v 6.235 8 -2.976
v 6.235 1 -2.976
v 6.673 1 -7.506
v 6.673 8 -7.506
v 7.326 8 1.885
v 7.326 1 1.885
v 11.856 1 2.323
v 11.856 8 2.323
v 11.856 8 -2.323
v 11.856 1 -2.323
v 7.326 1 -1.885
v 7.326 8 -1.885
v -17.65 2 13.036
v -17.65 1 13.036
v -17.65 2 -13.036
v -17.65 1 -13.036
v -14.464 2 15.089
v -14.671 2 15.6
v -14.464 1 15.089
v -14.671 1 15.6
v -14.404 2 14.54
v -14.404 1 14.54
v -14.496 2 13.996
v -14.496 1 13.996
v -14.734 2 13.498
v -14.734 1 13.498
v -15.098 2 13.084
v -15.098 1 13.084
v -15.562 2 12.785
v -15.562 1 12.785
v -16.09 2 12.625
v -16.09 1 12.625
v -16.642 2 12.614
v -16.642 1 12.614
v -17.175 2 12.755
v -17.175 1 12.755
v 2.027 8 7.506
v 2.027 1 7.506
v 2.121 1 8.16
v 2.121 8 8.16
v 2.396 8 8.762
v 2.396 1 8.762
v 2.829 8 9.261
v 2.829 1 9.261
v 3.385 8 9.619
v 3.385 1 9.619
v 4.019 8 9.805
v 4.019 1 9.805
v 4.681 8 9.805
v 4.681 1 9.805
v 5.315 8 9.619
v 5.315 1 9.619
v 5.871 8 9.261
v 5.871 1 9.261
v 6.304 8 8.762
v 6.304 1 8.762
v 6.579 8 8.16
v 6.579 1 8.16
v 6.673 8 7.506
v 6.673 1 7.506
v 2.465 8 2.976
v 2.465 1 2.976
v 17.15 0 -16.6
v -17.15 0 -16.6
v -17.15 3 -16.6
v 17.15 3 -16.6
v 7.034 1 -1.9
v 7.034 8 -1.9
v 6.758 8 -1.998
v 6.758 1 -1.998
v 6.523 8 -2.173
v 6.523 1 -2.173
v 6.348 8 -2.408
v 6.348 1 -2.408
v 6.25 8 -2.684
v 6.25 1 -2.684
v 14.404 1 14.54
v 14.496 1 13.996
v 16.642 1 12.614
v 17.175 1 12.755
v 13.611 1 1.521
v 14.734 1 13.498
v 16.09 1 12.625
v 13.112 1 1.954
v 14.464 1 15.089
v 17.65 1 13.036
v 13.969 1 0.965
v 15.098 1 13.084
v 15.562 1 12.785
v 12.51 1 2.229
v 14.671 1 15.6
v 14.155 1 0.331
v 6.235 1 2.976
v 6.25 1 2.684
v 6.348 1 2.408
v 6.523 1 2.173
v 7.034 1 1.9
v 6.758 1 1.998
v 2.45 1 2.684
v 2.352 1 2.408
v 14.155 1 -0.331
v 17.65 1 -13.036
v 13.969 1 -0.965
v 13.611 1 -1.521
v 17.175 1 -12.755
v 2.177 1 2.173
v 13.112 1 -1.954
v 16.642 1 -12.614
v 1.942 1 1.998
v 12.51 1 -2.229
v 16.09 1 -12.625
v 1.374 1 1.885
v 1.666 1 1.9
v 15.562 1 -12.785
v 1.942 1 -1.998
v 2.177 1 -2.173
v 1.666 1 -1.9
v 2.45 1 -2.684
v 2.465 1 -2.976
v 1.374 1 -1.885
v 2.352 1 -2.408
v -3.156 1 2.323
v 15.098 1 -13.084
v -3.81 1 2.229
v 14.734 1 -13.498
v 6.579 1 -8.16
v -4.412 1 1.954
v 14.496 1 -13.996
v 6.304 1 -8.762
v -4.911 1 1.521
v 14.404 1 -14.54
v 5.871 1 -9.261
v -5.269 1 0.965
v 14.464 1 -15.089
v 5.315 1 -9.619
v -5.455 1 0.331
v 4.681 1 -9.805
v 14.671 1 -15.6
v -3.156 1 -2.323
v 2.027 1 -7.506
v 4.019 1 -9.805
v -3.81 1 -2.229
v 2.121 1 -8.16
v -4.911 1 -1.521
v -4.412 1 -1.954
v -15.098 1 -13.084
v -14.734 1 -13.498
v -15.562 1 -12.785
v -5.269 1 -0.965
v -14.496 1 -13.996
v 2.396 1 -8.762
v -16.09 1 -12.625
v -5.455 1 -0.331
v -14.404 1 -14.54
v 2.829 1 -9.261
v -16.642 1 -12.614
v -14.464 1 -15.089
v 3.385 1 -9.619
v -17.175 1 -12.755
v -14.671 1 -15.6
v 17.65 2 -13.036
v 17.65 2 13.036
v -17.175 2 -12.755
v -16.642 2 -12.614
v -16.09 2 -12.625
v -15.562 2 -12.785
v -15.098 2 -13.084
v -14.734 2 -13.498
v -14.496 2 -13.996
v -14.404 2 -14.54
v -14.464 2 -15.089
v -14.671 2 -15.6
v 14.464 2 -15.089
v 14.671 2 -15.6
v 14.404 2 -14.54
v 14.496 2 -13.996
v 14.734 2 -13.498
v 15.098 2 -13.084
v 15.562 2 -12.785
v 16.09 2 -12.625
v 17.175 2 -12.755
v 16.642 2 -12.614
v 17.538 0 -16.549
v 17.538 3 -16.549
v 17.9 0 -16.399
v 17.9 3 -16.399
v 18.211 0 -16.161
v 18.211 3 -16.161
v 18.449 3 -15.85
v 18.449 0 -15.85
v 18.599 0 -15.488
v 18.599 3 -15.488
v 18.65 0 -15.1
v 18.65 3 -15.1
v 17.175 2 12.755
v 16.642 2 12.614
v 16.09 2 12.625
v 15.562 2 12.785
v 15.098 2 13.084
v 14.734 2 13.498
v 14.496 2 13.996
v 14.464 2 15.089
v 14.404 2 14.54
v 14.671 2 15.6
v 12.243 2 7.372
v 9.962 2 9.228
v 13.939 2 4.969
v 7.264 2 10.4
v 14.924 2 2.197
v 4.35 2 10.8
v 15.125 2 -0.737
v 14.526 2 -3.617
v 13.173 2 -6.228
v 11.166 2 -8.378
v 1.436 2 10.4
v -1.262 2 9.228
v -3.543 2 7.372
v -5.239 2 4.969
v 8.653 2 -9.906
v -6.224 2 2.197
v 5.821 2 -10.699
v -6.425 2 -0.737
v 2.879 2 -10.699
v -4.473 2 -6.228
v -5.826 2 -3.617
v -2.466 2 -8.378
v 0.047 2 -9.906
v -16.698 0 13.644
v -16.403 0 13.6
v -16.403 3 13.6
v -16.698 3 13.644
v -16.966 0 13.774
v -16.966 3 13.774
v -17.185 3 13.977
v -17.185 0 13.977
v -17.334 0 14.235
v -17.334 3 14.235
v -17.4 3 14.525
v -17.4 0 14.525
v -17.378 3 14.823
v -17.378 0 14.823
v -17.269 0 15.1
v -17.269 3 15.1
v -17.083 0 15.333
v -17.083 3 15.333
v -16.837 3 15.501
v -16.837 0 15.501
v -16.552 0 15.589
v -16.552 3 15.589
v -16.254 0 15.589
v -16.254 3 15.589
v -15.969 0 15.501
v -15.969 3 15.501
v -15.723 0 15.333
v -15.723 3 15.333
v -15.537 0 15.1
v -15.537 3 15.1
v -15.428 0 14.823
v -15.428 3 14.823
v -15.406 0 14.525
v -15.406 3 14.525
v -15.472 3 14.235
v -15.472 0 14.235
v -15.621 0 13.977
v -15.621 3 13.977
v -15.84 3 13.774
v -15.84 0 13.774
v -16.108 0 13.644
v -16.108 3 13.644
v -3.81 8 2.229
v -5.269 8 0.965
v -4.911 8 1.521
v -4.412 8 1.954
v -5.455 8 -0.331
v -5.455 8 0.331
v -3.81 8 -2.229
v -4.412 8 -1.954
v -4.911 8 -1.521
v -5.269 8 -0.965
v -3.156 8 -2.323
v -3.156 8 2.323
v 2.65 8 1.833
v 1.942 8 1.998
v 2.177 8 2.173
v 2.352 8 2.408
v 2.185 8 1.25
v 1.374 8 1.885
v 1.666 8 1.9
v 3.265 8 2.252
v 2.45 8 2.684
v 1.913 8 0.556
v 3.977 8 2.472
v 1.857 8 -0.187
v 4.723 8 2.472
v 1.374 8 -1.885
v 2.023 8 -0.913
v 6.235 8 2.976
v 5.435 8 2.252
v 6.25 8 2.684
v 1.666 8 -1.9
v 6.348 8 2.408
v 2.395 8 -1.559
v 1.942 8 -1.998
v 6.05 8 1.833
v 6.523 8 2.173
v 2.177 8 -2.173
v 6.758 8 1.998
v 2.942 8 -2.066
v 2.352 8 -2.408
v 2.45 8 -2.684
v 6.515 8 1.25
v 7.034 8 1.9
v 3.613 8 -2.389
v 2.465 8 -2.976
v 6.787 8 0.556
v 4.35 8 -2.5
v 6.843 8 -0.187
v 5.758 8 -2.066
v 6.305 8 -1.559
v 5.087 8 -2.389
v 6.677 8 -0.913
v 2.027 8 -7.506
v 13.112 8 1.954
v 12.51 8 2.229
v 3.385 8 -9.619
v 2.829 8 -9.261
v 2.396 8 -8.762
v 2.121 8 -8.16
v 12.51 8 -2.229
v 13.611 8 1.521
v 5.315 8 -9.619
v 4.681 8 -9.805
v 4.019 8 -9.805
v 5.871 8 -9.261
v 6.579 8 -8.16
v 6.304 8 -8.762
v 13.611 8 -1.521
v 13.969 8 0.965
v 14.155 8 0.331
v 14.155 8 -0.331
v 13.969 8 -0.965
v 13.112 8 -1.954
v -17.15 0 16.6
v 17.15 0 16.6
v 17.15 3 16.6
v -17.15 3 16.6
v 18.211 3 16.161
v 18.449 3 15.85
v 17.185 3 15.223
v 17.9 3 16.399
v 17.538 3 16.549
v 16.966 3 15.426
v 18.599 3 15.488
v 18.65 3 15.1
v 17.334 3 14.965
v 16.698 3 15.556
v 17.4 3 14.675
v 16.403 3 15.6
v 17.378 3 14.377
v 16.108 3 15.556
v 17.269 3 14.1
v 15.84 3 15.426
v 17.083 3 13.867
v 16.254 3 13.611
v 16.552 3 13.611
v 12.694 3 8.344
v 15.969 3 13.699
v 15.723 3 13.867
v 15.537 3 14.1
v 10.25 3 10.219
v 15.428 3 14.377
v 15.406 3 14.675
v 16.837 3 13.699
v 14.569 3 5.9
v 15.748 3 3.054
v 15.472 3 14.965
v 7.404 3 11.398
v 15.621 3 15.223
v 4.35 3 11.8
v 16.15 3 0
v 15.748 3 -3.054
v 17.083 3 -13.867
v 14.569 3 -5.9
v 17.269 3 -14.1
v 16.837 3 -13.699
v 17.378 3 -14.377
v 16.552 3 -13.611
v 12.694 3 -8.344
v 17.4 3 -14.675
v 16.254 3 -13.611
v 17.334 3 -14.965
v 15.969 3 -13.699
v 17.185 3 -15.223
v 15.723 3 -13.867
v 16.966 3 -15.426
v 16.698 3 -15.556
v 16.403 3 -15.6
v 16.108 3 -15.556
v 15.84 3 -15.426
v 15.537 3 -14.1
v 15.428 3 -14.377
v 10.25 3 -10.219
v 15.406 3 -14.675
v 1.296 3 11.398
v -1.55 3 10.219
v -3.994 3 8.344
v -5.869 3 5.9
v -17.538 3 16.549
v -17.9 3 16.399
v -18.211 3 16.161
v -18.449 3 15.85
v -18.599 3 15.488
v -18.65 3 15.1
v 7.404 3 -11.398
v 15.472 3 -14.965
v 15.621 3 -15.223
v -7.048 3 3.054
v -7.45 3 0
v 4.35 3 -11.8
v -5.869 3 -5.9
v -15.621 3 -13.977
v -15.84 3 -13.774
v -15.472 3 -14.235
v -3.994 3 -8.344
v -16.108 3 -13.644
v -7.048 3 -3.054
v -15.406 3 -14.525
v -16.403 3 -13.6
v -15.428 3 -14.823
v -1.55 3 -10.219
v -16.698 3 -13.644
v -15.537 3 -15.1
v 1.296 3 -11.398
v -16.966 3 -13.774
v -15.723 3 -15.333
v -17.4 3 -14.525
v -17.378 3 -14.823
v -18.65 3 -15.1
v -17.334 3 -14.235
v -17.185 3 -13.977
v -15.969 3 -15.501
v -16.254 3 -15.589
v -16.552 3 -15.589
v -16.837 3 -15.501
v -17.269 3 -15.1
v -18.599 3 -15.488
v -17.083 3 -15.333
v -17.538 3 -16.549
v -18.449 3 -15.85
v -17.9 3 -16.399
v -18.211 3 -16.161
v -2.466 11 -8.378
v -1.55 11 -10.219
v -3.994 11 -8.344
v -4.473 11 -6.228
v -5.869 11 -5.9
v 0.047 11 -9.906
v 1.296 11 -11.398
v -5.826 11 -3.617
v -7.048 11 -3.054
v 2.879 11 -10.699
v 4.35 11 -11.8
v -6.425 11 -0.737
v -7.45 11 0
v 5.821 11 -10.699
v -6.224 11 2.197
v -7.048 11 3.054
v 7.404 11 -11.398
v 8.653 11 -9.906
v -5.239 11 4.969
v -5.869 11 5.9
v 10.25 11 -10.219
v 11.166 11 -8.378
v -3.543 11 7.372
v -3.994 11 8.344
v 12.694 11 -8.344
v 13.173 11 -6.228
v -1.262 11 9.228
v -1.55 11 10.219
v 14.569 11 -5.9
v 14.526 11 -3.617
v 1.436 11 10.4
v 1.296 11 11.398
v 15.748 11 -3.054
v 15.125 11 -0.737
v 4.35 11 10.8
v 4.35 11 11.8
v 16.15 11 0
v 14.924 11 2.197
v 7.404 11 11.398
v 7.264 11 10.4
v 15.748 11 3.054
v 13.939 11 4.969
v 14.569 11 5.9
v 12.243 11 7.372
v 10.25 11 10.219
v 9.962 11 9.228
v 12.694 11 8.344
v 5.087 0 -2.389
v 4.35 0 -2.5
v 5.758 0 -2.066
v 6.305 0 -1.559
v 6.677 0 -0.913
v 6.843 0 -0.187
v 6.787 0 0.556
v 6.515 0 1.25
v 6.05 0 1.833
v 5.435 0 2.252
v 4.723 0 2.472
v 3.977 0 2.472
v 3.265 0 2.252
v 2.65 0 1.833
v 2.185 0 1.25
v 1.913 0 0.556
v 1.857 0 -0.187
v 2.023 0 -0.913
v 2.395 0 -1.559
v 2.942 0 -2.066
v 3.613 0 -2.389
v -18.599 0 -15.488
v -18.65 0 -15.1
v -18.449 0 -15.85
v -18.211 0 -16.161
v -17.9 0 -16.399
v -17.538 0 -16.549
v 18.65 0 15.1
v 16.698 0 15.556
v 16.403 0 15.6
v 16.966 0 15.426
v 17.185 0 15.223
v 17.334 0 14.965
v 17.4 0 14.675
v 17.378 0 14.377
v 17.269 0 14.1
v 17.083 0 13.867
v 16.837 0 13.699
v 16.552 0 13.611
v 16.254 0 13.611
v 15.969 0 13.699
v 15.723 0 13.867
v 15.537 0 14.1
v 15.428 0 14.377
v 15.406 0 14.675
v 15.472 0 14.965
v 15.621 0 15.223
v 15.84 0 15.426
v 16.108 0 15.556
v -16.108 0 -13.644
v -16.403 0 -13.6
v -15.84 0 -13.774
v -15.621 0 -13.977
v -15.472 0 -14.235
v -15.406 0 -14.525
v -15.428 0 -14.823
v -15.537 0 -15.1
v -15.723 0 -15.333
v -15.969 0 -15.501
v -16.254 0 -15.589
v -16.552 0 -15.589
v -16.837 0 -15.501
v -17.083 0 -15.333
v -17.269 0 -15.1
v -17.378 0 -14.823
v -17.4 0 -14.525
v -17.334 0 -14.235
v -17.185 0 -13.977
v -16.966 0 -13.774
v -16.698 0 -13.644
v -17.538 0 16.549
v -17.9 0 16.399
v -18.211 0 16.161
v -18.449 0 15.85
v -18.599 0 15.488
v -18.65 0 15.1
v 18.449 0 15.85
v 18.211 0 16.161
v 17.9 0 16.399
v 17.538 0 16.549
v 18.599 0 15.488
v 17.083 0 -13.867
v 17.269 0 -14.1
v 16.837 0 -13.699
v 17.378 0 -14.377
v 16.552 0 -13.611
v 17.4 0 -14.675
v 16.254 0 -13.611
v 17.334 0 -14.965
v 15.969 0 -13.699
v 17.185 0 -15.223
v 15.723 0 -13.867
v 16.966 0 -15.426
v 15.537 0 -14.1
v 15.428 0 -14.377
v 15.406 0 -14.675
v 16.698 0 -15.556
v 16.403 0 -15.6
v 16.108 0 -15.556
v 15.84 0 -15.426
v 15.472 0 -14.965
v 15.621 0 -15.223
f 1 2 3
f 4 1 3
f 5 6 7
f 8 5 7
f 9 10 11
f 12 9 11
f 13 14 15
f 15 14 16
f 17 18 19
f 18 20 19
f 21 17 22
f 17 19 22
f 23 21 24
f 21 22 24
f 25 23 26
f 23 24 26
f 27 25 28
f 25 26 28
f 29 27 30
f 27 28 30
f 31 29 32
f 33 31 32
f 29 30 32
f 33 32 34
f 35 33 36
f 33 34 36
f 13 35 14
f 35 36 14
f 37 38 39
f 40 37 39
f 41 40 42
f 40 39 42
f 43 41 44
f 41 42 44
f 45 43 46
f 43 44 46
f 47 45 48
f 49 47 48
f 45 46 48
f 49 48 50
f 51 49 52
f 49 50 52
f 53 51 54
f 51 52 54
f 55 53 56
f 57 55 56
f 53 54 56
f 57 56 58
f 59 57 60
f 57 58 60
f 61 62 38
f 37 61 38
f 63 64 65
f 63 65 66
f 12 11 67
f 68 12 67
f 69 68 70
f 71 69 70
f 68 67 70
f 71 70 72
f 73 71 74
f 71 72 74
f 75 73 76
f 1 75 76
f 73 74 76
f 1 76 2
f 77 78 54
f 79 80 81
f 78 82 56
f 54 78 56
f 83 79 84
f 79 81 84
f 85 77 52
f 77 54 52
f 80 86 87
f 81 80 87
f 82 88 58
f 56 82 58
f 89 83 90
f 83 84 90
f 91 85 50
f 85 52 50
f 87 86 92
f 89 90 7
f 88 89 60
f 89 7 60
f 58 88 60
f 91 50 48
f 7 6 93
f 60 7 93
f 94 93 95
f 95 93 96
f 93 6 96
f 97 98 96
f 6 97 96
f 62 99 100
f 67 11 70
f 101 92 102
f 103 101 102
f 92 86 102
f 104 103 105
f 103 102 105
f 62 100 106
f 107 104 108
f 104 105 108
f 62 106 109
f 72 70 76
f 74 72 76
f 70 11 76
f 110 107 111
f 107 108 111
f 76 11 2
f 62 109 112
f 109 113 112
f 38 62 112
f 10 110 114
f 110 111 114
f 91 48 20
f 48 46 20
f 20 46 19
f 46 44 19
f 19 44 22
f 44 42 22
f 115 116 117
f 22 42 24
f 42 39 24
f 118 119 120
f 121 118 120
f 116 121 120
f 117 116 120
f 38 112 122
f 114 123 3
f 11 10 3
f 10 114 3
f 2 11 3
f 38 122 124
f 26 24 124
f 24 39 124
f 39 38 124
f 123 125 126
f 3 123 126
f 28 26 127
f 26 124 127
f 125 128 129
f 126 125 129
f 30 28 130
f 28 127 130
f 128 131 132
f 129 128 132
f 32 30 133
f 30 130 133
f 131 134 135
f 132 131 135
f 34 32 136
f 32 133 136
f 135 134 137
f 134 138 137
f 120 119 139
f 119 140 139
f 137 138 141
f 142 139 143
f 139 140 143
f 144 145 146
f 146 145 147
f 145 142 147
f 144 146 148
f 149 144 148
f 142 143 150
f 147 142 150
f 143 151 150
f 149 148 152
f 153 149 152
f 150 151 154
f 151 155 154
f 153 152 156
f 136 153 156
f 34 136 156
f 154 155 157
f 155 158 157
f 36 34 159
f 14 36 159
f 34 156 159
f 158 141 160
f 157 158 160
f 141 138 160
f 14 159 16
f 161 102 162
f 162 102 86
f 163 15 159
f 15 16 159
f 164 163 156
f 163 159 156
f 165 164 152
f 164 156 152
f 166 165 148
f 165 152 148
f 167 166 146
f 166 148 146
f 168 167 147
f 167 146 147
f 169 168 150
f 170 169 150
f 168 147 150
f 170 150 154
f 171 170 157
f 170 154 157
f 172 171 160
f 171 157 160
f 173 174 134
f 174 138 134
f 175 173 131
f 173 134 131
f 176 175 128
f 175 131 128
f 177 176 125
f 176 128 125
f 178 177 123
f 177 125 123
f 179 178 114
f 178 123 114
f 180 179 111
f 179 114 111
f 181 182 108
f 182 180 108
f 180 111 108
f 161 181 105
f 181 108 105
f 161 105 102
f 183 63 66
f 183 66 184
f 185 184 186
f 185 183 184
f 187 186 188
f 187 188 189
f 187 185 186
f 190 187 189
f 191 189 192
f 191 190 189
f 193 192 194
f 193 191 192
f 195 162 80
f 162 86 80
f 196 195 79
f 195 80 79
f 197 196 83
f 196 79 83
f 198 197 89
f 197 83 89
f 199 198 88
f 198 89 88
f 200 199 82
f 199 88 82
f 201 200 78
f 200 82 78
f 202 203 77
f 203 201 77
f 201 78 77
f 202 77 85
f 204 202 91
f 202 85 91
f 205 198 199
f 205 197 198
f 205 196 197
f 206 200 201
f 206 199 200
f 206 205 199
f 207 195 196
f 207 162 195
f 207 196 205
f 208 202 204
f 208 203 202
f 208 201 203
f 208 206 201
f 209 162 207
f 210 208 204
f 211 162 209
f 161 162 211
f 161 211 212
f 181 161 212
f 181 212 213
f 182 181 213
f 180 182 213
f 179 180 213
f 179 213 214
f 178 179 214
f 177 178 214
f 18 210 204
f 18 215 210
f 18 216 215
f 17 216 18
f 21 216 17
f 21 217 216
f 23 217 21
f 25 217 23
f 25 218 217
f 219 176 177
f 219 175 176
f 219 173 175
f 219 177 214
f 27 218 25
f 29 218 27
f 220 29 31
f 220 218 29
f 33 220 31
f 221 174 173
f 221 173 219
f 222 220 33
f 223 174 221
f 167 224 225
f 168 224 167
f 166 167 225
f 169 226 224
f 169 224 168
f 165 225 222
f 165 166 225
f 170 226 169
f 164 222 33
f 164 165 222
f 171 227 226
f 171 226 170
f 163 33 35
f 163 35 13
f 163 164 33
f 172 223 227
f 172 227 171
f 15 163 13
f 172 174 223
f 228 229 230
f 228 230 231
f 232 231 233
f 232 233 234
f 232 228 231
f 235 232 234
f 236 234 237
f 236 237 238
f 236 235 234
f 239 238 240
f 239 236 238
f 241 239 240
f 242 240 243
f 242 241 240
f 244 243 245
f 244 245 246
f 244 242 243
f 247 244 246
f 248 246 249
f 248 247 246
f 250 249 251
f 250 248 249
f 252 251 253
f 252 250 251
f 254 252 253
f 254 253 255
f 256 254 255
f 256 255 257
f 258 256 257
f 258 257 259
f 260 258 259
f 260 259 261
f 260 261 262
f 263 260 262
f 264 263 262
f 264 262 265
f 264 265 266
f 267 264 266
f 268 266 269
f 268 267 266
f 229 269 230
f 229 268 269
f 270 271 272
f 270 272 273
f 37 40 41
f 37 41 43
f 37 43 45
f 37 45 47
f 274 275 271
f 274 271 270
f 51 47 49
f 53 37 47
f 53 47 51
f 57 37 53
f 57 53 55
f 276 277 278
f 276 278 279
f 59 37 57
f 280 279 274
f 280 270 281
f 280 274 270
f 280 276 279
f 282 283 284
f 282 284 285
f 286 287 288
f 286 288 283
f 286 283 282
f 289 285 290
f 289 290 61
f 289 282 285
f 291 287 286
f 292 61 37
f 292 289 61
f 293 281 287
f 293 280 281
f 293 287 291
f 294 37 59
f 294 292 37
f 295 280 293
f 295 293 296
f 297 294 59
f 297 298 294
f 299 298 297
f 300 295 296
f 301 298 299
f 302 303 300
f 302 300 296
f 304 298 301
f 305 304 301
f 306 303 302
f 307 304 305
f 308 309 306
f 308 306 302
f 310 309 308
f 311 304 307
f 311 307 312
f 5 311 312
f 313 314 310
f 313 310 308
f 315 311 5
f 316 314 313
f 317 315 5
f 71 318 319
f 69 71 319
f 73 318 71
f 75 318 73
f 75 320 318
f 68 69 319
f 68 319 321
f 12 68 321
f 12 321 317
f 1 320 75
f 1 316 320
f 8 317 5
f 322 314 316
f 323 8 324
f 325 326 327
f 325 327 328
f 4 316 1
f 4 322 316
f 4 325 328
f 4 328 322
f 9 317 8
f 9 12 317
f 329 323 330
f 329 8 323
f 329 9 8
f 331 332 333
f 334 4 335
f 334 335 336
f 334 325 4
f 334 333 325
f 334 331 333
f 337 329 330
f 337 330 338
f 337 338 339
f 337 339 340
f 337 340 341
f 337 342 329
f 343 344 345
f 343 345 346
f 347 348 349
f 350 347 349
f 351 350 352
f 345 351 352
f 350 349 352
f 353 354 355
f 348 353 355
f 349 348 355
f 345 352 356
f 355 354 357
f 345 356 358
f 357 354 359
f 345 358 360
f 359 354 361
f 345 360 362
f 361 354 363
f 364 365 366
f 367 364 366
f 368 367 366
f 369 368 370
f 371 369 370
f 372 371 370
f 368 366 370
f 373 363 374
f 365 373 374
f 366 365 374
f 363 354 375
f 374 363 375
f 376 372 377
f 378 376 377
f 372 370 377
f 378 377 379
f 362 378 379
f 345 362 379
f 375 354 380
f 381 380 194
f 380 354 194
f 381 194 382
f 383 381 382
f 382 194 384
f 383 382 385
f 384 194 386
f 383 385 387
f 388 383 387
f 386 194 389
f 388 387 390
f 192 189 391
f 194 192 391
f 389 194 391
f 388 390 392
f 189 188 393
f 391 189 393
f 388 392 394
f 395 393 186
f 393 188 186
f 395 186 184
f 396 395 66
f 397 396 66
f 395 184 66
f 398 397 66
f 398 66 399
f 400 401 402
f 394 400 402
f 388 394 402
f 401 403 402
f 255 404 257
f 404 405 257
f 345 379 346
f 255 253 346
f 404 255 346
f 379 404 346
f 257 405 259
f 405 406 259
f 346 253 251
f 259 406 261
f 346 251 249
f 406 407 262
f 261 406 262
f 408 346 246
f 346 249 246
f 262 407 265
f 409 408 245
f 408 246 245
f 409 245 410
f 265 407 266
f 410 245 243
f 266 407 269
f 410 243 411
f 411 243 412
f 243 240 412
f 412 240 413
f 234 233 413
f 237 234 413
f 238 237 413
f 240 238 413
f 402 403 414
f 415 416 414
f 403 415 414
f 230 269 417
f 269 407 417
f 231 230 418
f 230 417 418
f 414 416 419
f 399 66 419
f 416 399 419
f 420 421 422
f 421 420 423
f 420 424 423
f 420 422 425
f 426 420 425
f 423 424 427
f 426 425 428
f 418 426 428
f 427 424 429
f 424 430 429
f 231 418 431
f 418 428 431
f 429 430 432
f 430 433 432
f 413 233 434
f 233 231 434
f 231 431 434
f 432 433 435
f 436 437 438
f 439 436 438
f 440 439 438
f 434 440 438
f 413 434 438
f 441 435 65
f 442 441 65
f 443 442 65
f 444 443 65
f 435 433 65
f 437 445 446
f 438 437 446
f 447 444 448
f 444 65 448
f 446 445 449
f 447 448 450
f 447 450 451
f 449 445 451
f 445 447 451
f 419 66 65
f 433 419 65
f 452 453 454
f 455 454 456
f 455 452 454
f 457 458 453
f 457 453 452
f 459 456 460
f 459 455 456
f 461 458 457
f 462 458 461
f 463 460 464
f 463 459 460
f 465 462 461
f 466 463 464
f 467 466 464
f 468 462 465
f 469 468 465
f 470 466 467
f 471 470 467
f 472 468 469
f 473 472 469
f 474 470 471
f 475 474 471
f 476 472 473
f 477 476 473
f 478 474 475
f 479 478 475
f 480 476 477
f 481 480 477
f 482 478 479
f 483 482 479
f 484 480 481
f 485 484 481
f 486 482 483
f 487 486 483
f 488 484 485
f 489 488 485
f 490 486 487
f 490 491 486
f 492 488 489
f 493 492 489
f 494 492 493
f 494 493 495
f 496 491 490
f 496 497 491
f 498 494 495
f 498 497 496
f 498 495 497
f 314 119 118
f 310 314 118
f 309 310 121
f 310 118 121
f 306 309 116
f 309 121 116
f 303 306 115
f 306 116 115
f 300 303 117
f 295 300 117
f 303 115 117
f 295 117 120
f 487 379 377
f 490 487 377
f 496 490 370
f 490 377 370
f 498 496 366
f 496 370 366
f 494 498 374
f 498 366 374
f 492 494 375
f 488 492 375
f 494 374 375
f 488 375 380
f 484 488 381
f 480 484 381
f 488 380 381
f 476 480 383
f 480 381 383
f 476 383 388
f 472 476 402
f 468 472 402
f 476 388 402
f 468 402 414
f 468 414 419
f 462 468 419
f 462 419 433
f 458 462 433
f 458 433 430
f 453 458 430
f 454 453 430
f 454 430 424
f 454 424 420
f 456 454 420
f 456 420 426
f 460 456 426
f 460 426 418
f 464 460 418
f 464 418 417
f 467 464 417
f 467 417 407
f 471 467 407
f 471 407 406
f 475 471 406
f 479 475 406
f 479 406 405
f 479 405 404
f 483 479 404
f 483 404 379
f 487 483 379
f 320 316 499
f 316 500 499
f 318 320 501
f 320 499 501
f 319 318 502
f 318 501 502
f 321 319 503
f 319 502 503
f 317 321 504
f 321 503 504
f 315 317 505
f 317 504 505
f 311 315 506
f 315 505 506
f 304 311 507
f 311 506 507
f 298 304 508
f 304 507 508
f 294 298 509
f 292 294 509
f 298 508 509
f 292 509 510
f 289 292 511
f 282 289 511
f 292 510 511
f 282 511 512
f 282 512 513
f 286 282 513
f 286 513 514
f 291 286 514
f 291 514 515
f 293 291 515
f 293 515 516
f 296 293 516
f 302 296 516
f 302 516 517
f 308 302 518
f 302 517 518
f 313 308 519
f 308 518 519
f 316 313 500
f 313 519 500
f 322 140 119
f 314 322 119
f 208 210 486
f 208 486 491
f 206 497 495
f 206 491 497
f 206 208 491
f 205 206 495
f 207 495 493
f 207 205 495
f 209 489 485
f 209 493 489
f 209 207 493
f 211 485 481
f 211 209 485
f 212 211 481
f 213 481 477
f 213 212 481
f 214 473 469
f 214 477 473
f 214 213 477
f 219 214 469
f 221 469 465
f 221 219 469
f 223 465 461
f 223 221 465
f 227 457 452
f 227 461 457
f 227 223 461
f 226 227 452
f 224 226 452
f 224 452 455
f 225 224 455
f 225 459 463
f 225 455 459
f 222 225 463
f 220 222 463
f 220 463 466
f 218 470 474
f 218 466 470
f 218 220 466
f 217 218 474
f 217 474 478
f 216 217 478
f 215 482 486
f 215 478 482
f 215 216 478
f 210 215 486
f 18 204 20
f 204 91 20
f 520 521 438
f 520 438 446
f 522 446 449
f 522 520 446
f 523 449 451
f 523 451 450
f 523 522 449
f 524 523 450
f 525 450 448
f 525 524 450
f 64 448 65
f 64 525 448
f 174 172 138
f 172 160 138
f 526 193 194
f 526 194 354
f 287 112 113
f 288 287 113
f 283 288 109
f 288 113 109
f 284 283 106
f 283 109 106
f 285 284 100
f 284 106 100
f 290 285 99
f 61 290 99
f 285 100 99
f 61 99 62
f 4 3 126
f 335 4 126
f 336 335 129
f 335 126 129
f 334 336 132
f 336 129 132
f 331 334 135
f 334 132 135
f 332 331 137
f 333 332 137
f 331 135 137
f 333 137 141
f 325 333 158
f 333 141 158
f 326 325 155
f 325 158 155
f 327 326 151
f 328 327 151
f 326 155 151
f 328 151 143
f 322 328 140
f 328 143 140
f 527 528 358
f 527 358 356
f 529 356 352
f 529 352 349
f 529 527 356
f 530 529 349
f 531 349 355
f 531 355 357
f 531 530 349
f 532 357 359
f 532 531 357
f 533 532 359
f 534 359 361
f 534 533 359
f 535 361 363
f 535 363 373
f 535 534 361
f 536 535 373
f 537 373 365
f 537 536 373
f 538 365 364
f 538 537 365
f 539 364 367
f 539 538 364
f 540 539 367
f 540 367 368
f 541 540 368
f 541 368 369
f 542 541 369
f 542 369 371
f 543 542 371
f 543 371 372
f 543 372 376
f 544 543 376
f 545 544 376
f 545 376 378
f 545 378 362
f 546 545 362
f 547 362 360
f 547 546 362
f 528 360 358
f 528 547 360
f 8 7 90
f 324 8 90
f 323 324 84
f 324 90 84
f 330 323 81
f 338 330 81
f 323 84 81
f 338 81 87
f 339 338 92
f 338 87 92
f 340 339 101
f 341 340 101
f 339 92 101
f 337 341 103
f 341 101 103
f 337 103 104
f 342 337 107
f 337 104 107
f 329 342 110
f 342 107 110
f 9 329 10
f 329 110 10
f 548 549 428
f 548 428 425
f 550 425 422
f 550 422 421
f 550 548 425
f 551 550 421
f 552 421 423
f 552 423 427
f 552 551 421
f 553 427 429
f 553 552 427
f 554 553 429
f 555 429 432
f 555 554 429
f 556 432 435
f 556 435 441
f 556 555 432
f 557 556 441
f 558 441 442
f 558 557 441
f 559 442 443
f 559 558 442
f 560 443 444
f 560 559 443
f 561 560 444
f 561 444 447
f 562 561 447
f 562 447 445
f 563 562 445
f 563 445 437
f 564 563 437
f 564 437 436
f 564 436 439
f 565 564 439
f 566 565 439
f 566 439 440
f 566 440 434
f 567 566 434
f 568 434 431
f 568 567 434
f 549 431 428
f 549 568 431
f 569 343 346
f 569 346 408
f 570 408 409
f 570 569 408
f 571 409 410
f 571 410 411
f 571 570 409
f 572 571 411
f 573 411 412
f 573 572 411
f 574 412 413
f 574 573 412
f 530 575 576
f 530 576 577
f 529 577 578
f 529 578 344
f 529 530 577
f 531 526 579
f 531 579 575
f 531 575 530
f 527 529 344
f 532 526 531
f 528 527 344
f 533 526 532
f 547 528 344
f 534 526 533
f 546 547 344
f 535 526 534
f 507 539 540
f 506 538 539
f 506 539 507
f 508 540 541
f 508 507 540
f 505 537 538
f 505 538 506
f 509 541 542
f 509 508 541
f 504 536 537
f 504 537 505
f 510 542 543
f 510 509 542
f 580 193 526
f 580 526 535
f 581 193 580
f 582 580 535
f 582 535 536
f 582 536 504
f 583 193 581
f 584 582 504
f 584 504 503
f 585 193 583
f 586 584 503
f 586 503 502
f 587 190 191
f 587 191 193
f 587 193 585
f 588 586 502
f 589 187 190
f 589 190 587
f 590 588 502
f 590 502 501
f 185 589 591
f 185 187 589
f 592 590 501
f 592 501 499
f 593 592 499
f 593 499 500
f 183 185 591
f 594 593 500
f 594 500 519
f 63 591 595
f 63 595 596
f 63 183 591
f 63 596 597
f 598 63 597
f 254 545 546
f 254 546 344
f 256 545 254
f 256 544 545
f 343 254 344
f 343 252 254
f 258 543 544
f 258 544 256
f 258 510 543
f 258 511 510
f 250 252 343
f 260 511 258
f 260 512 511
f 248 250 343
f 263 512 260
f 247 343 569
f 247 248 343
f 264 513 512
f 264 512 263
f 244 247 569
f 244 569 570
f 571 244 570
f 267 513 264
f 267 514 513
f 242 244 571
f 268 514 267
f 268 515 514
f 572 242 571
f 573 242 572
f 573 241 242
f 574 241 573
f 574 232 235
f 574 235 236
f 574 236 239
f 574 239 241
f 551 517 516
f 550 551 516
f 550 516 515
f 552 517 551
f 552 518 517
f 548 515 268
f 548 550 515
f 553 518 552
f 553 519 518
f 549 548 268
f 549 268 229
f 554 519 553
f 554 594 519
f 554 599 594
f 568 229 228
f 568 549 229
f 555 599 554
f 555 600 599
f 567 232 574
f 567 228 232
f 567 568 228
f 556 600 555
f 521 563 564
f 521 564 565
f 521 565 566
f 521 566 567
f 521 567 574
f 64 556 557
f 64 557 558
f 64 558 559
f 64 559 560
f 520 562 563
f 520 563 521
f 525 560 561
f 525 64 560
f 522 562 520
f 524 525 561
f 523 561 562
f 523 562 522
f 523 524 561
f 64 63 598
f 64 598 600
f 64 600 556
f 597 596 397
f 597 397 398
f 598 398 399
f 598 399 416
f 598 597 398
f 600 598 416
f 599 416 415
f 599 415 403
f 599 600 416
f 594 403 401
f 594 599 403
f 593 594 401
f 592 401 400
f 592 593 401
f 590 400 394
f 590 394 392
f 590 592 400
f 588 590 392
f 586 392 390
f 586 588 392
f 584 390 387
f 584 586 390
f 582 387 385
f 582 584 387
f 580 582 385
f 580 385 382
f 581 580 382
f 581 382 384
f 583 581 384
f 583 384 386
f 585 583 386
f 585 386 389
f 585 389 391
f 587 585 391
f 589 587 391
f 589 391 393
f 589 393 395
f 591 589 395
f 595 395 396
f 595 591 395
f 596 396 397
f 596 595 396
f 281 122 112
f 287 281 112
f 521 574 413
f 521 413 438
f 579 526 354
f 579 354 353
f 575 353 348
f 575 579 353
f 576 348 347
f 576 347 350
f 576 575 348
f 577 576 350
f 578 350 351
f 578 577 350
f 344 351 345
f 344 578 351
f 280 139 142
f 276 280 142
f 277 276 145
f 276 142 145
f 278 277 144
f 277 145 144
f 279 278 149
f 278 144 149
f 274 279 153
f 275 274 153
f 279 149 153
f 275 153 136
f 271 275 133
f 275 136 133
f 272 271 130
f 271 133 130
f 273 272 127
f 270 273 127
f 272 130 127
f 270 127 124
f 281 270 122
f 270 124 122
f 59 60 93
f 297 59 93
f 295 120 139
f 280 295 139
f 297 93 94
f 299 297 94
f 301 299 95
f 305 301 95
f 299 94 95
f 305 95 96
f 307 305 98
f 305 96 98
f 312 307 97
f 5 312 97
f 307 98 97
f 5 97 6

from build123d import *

# Parameters (mm, degrees)
SKETCH1_R           = 11.8
SKETCH1_R_2         = 1
BOSS_EXTRUDE1_DEPTH = 3
SKETCH3_R           = 11.8
BOSS_EXTRUDE2_DEPTH = 11
SHELL1_T            = -1
SKETCH4_R           = 2.5
CUT_EXTRUDE2_DEPTH  = 3
BOSS_EXTRUDE4_DEPTH = 7
SKETCH6_R           = 2.5
CUT_EXTRUDE3_DEPTH  = 27.895771043


with BuildPart() as part:
    # Sketch1 → Boss-Extrude1 (new body)
    with BuildSketch(Plane(origin=(0, 0, 0), x_dir=(1, 0, 0), z_dir=(0, 1, 0))):
        with BuildLine():
            Line((-17.15, 16.6), (17.15, 16.6))
            ThreePointArc((17.15, 16.6), (18.210660172, 16.160660172), (18.65, 15.1))
            Line((18.65, 15.1), (18.65, -15.1))
            ThreePointArc((18.65, -15.1), (18.210660172, -16.160660172), (17.15, -16.6))
            Line((17.15, -16.6), (-17.15, -16.6))
            ThreePointArc((-17.15, -16.6), (-18.210660172, -16.160660172), (-18.65, -15.1))
            Line((-18.65, -15.1), (-18.65, 15.1))
            ThreePointArc((-18.65, 15.1), (-18.210660172, 16.160660172), (-17.15, 16.6))
        make_face()
        with Locations(Location((4.35, 0, 0), (0, 0, 270))):
            Circle(SKETCH1_R, mode=Mode.SUBTRACT)
        with Locations(Location((-16.403012048, 14.6, 0), (0, 0, 270))):
            Circle(SKETCH1_R_2, mode=Mode.SUBTRACT)
        with Locations(Location((16.403012048, 14.6, 0), (0, 0, 90))):
            Circle(SKETCH1_R_2, mode=Mode.SUBTRACT)
        with Locations(Location((16.403012048, -14.6, 0), (0, 0, 270))):
            Circle(SKETCH1_R_2, mode=Mode.SUBTRACT)
        with Locations(Location((-16.403012048, -14.6, 0), (0, 0, 90))):
            Circle(SKETCH1_R_2, mode=Mode.SUBTRACT)
    extrude(amount=BOSS_EXTRUDE1_DEPTH)

    # Sketch3 → Boss-Extrude2 (add)
    with BuildSketch(Plane(origin=(0, 0, 0), x_dir=(1, 0, 0), z_dir=(0, 1, 0))):
        with Locations(Location((4.35, 0, 0), (0, 0, 270))):
            Circle(SKETCH3_R)
    extrude(amount=BOSS_EXTRUDE2_DEPTH)

    # Shell1
    shell1_openings = [part.faces().sort_by_distance(p)[0] for p in [
        (4.35, 11, 0),
    ]]
    offset(amount=SHELL1_T, openings=shell1_openings, kind=Kind.INTERSECTION)

    # Sketch4 → Cut-Extrude2 (cut)
    with BuildSketch(Plane.XZ):
        with Locations(Location((4.35, 0, 0), (0, 0, 270))):
            Circle(SKETCH4_R)
    extrude(amount=-CUT_EXTRUDE2_DEPTH, mode=Mode.SUBTRACT)

    # Sketch5 → Boss-Extrude4 (add)
    with BuildSketch(Plane(origin=(0, 1, 0), x_dir=(1, 0, 0), z_dir=(0, 1, 0))):
        with BuildLine():
            Line((2.02679539, 7.505692886), (2.465229351, 2.97646884))
            ThreePointArc((2.465229351, 2.97646884), (2.176988688, 2.173011312), (1.37353116, 1.884770649))
            Line((1.37353116, 1.884770649), (-3.155692886, 2.32320461))
            ThreePointArc((-3.155692886, 2.32320461), (-5.478897496, 0), (-3.155692886, -2.32320461))
            Line((-3.155692886, -2.32320461), (1.37353116, -1.884770649))
            ThreePointArc((1.37353116, -1.884770649), (2.176988688, -2.173011312), (2.465229351, -2.97646884))
            Line((2.465229351, -2.97646884), (2.02679539, -7.505692886))
            ThreePointArc((2.02679539, -7.505692886), (4.35, -9.828897496), (6.67320461, -7.505692886))
            Line((6.67320461, -7.505692886), (6.234770649, -2.97646884))
            ThreePointArc((6.234770649, -2.97646884), (6.523011312, -2.173011312), (7.32646884, -1.884770649))
            Line((7.32646884, -1.884770649), (11.855692886, -2.32320461))
            ThreePointArc((11.855692886, -2.32320461), (14.178897496, 0), (11.855692886, 2.32320461))
            Line((11.855692886, 2.32320461), (7.32646884, 1.884770649))
            ThreePointArc((7.32646884, 1.884770649), (6.523011312, 2.173011312), (6.234770649, 2.97646884))
            Line((6.234770649, 2.97646884), (6.67320461, 7.505692886))
            ThreePointArc((6.67320461, 7.505692886), (4.35, 9.828897496), (2.02679539, 7.505692886))
        make_face()
    extrude(amount=BOSS_EXTRUDE4_DEPTH)

    # Sketch6 → Cut-Extrude3 (cut, through all)
    with BuildSketch(Plane.XZ.offset(-1)):
        with Locations(Location((4.35, 0, 0), (0, 0, 270))):
            Circle(SKETCH6_R)
    extrude(amount=-CUT_EXTRUDE3_DEPTH, mode=Mode.SUBTRACT)


solid = part.part
